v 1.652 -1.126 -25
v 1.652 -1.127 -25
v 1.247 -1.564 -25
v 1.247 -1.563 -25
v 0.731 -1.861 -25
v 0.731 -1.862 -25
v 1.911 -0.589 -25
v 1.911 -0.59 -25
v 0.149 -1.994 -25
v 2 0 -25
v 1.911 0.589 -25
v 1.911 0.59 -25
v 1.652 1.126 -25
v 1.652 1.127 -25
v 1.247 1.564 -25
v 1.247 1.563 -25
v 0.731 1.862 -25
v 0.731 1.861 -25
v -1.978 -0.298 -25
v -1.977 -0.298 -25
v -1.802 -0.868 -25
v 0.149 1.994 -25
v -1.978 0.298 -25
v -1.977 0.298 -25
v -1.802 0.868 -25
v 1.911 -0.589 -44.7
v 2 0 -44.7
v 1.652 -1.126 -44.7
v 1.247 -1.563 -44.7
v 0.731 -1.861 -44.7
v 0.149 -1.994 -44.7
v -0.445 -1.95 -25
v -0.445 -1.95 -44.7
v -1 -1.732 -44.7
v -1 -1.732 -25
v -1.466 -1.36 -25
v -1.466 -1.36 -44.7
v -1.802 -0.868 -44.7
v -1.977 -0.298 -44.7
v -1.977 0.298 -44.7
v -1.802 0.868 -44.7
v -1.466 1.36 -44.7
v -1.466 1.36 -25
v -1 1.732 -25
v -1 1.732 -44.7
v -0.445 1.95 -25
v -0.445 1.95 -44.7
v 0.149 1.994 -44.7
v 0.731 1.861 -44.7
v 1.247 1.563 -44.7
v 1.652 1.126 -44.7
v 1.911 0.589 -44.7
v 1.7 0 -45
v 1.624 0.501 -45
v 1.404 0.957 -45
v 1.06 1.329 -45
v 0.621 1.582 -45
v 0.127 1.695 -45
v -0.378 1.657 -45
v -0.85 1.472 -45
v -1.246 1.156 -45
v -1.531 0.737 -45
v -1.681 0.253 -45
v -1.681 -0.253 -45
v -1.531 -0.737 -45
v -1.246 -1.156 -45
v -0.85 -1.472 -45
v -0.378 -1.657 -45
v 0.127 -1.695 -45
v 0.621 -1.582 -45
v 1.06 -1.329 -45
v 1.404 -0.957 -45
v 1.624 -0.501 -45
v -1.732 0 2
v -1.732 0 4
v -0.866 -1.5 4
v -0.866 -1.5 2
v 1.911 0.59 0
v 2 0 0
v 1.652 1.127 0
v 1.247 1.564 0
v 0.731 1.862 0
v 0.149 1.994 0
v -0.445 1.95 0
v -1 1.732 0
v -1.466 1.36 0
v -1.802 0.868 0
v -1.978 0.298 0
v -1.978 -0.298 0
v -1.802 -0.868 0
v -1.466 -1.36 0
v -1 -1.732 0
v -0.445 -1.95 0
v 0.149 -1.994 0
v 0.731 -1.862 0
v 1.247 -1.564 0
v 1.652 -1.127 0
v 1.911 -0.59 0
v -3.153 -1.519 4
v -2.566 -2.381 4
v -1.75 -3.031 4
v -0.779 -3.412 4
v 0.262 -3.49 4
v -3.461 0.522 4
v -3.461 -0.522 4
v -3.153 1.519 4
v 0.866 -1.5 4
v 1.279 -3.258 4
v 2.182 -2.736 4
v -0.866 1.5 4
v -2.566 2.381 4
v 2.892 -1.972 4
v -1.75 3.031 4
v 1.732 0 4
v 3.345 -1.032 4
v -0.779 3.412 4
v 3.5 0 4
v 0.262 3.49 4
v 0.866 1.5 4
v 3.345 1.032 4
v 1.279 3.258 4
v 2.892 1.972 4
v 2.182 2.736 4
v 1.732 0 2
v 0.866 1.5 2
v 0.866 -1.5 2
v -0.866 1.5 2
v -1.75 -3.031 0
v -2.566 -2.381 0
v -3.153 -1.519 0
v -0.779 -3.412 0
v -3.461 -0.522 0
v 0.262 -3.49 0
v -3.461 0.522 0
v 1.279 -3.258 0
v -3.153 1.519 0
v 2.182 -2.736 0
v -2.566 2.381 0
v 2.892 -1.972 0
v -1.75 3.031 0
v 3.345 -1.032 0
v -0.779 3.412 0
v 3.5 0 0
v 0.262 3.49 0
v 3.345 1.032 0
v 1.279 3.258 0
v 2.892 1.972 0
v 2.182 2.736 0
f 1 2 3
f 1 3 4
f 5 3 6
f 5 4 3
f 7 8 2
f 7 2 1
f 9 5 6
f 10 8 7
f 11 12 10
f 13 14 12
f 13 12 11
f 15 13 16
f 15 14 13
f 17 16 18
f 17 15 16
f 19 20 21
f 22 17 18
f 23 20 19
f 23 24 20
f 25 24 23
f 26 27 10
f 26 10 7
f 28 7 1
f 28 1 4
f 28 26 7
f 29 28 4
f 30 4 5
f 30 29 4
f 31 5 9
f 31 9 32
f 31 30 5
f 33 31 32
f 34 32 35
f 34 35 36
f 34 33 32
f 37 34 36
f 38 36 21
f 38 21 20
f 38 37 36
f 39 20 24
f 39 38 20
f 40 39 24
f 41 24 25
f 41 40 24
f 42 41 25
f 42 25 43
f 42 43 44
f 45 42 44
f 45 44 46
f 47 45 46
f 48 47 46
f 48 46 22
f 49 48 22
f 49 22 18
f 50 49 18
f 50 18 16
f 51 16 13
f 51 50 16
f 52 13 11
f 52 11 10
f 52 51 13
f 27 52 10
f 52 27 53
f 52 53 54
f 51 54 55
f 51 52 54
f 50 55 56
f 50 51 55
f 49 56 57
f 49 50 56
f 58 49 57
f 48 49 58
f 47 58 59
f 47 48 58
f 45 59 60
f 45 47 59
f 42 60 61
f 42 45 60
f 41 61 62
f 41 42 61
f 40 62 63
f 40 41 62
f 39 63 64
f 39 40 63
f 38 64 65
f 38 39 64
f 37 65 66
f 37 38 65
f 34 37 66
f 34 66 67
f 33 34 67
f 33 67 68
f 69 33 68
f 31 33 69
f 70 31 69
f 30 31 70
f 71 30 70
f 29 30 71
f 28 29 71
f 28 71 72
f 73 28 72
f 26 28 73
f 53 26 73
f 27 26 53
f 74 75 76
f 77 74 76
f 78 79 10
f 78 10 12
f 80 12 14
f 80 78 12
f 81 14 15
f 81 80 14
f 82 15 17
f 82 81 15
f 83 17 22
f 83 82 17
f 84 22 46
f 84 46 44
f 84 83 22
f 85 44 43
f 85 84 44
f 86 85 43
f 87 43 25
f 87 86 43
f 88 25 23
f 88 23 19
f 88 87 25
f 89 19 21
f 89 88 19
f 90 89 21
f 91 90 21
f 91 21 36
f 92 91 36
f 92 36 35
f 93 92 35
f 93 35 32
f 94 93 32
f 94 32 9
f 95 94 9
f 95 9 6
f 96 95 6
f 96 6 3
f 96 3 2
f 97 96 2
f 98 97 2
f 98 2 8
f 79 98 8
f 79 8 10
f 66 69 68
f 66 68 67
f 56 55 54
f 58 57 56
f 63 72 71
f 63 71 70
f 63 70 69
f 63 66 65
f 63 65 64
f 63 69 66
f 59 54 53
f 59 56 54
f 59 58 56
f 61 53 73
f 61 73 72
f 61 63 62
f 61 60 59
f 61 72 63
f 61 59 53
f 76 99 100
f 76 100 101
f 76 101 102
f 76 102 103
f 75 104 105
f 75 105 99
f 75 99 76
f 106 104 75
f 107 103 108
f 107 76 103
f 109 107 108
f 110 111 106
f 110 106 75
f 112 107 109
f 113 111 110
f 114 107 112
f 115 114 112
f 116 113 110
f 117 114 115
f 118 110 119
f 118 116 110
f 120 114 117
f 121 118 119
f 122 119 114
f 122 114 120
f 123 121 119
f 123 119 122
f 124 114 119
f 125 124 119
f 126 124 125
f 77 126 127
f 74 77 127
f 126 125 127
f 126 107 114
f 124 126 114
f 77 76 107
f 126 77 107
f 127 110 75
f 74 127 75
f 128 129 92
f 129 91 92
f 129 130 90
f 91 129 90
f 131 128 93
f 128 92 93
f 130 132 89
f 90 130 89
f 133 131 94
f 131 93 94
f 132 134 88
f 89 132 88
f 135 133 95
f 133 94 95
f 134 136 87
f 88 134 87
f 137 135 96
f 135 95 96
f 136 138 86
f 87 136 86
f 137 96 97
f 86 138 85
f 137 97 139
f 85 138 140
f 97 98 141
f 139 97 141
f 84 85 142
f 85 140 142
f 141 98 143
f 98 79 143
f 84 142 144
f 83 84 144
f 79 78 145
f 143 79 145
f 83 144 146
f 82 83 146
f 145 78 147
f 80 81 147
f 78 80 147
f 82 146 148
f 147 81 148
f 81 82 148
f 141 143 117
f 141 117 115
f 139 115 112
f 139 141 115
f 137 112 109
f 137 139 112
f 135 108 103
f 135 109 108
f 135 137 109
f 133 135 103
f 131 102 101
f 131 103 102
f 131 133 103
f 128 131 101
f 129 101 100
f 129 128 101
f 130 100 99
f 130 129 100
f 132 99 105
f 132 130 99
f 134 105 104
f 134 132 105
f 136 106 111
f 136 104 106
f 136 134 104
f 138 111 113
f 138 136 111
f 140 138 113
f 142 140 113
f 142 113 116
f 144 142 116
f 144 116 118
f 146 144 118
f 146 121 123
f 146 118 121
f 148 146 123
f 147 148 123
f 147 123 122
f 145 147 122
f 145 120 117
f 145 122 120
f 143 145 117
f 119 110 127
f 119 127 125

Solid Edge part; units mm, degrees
sketch "Sketch1" plane through (0, 0, 0) normal (0, 0, 1) x (1, 0, 0)
  circle A0 centre (0, 0) radius 3.5
  dimension "D1" = 7
extrude "Protrusion1" add sketch "Sketch1" along normal blind 4
sketch "Sketch2" plane through (0, 0, 0) normal (0, 0, -1) x (1, 0, 0)
  circle A0 centre (0, 0) radius 2
extrude "Protrusion2" add sketch "Sketch2" along normal blind 45
sketch "Sketch3" plane through (0, 0, -45) normal (0, 0, -1) x (1, 0, 0)
  circle A0 centre (0, 0) radius 1.9997
extrude "Cutout1" cut sketch "Sketch3" against normal blind 20 flip side to cut
chamfer "Chamfer_1" distance 0.3 angle 45 1 edges at (-1.9997, 0, -45)
sketch "Sketch4" plane through (0, 0, 4) normal (0, 0, 1) x (1, 0, 0)
  line L0 (-0.866, 1.5) -> (0.866, 1.5)
  line L1 (1.7321, 0) -> (0.866, 1.5)
  line L2 (0.866, -1.5) -> (1.7321, 0)
  line L3 (-0.866, -1.5) -> (0.866, -1.5)
  line L4 (-1.7321, 0) -> (-0.866, -1.5)
  line L5 (-0.866, 1.5) -> (-1.7321, 0)
  dimension "D1" = 3
extrude "Cutout2" cut sketch "Sketch4" against normal blind 2
properties part number "185696" material "Stainless Steel, 304"
